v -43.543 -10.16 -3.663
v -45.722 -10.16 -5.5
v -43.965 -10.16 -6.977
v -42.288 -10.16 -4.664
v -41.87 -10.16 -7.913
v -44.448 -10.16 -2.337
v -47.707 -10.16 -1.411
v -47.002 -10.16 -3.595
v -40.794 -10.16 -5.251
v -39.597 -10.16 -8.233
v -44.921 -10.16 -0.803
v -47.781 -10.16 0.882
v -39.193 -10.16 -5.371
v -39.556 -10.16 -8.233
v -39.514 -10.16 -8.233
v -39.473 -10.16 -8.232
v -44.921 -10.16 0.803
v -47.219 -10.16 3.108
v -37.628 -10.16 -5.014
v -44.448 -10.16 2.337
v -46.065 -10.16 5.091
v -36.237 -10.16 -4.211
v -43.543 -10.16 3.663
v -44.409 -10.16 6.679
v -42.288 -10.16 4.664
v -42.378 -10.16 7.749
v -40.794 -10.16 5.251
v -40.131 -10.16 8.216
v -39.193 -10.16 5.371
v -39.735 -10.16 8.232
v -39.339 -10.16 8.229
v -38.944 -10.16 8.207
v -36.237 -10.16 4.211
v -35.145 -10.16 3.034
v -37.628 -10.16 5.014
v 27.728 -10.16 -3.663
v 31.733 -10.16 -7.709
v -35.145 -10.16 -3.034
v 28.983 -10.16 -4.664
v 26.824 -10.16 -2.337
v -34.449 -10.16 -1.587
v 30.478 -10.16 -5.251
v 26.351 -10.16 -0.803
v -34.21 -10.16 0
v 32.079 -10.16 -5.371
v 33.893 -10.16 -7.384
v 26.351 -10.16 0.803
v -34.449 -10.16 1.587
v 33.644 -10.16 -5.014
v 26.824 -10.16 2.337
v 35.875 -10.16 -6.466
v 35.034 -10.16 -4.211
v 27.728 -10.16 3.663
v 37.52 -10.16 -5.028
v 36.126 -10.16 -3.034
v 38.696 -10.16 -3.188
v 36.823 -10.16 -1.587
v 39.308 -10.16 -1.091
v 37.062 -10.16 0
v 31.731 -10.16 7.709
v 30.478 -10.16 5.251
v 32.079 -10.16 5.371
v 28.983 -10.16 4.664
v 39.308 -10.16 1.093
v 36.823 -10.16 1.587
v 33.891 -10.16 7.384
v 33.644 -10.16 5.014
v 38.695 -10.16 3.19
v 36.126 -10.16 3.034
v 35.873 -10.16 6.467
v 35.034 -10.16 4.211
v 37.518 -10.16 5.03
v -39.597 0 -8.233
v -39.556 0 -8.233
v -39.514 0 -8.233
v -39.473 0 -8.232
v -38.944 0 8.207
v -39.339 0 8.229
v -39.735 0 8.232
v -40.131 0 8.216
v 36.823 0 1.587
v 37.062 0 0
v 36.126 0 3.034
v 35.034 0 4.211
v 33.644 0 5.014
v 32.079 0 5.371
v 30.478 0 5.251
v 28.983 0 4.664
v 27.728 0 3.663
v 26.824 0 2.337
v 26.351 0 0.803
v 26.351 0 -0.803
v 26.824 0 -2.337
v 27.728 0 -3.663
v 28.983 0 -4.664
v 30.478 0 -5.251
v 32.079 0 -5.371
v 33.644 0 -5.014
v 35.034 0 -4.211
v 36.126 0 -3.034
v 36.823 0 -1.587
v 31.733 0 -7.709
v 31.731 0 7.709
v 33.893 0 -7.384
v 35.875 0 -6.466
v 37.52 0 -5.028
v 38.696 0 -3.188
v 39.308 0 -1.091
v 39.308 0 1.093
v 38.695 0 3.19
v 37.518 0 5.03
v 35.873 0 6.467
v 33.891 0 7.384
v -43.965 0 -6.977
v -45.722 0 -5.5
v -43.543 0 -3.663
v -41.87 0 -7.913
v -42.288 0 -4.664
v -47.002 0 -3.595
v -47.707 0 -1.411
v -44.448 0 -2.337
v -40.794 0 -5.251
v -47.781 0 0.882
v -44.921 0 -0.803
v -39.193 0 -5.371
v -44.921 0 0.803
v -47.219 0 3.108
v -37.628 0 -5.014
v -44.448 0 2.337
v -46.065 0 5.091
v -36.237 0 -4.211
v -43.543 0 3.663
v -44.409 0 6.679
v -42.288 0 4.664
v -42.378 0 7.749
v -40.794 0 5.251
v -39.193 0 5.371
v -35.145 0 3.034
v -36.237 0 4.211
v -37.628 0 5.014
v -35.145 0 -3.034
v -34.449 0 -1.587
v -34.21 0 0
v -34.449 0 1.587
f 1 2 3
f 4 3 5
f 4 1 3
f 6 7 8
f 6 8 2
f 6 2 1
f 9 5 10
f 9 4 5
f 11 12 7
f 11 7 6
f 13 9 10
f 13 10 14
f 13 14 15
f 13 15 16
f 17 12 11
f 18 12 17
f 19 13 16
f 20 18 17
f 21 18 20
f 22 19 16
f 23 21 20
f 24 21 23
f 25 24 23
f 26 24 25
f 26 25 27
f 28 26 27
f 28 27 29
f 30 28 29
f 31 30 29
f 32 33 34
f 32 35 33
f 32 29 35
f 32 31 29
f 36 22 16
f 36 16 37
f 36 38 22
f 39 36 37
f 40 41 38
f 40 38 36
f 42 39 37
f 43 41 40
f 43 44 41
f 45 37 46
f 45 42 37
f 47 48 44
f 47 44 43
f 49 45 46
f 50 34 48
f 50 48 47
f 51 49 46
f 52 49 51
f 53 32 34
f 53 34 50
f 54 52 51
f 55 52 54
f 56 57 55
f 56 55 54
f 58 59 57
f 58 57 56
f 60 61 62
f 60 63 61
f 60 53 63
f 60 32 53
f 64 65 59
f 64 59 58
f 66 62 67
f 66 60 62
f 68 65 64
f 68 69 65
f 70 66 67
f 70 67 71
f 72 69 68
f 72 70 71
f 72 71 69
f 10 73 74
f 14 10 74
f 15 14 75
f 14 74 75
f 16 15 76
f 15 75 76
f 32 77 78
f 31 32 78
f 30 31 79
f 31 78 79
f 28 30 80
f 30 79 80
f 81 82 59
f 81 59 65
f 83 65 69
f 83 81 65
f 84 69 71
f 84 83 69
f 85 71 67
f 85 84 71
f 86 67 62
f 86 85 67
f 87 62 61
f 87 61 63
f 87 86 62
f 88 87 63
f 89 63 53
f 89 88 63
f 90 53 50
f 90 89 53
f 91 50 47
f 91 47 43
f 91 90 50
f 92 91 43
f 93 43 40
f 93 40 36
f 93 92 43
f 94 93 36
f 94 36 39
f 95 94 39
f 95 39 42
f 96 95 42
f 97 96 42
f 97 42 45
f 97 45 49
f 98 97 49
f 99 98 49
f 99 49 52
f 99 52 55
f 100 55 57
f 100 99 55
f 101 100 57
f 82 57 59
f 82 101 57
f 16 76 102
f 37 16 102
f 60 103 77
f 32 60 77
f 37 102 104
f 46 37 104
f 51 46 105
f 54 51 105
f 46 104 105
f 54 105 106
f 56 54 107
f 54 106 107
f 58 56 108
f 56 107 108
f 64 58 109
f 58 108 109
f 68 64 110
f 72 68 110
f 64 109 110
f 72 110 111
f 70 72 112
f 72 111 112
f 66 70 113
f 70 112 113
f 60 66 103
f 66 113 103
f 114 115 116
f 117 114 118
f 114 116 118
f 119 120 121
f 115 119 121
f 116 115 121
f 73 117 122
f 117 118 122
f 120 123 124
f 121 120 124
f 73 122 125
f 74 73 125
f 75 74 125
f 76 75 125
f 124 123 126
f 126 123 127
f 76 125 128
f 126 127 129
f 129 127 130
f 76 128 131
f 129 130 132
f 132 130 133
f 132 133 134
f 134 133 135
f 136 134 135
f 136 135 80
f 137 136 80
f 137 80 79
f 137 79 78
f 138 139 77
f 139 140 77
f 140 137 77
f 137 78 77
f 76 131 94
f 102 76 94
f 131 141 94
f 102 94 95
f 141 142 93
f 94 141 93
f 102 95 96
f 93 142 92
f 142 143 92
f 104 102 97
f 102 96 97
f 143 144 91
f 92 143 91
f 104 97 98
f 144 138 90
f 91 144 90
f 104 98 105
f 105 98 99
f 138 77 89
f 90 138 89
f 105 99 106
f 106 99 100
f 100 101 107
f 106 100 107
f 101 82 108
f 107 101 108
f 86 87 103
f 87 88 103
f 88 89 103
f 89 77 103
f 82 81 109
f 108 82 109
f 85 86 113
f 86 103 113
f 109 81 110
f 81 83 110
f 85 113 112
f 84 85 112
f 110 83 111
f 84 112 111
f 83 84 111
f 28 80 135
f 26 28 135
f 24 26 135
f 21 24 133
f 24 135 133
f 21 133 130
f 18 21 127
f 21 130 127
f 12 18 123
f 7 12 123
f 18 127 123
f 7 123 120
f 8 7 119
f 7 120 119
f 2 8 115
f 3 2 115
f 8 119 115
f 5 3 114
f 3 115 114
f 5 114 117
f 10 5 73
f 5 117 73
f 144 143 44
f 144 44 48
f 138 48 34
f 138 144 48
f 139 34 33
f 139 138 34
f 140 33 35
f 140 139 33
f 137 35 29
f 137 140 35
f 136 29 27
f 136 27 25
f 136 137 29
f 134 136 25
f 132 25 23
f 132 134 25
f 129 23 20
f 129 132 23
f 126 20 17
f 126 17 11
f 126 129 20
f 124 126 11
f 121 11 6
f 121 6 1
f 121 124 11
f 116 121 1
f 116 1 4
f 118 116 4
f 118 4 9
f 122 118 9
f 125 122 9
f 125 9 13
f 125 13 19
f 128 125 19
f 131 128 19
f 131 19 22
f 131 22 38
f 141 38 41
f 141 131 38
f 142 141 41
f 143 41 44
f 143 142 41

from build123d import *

# Parameters (mm, degrees)
F0_R     = 5.385815
F0_R_2   = 5.385812
F1_DEPTH = 10.16


with BuildPart() as f1:
    # F0 (on Front) → F1 (new body)
    with BuildSketch(Plane.XZ):
        with BuildLine():
            Line((-40.131064, 8.215562), (-38.943939, 8.207193))
            ThreePointArc((-38.943939, 8.207193), (-39.53735, 8.232802), (-40.131064, 8.215562))
        make_face()
        with BuildLine():
            Line((31.730667, 7.708937), (-38.943939, 8.207193))
            Line((-38.943939, 8.207193), (-40.131064, 8.215562))
            ThreePointArc((-40.131064, 8.215562), (-47.824065, -0.267089), (-39.59717, -8.233007))
            Line((-39.59717, -8.233007), (-39.472638, -8.232092))
            Line((-39.472638, -8.232092), (31.732959, -7.70892))
            ThreePointArc((31.732959, -7.70892), (39.385447, 0.001146), (31.730667, 7.708937))
        make_face()
        with Locations((-39.595392, 0)):
            Circle(F0_R, mode=Mode.SUBTRACT)
        with Locations((31.676318, 0)):
            Circle(F0_R_2, mode=Mode.SUBTRACT)
        with BuildLine():
            Line((-39.472638, -8.232092), (-39.59717, -8.233007))
            ThreePointArc((-39.59717, -8.233007), (-39.534903, -8.232785), (-39.472638, -8.232092))
        make_face()
    extrude(amount=F1_DEPTH)


solid = f1.part
